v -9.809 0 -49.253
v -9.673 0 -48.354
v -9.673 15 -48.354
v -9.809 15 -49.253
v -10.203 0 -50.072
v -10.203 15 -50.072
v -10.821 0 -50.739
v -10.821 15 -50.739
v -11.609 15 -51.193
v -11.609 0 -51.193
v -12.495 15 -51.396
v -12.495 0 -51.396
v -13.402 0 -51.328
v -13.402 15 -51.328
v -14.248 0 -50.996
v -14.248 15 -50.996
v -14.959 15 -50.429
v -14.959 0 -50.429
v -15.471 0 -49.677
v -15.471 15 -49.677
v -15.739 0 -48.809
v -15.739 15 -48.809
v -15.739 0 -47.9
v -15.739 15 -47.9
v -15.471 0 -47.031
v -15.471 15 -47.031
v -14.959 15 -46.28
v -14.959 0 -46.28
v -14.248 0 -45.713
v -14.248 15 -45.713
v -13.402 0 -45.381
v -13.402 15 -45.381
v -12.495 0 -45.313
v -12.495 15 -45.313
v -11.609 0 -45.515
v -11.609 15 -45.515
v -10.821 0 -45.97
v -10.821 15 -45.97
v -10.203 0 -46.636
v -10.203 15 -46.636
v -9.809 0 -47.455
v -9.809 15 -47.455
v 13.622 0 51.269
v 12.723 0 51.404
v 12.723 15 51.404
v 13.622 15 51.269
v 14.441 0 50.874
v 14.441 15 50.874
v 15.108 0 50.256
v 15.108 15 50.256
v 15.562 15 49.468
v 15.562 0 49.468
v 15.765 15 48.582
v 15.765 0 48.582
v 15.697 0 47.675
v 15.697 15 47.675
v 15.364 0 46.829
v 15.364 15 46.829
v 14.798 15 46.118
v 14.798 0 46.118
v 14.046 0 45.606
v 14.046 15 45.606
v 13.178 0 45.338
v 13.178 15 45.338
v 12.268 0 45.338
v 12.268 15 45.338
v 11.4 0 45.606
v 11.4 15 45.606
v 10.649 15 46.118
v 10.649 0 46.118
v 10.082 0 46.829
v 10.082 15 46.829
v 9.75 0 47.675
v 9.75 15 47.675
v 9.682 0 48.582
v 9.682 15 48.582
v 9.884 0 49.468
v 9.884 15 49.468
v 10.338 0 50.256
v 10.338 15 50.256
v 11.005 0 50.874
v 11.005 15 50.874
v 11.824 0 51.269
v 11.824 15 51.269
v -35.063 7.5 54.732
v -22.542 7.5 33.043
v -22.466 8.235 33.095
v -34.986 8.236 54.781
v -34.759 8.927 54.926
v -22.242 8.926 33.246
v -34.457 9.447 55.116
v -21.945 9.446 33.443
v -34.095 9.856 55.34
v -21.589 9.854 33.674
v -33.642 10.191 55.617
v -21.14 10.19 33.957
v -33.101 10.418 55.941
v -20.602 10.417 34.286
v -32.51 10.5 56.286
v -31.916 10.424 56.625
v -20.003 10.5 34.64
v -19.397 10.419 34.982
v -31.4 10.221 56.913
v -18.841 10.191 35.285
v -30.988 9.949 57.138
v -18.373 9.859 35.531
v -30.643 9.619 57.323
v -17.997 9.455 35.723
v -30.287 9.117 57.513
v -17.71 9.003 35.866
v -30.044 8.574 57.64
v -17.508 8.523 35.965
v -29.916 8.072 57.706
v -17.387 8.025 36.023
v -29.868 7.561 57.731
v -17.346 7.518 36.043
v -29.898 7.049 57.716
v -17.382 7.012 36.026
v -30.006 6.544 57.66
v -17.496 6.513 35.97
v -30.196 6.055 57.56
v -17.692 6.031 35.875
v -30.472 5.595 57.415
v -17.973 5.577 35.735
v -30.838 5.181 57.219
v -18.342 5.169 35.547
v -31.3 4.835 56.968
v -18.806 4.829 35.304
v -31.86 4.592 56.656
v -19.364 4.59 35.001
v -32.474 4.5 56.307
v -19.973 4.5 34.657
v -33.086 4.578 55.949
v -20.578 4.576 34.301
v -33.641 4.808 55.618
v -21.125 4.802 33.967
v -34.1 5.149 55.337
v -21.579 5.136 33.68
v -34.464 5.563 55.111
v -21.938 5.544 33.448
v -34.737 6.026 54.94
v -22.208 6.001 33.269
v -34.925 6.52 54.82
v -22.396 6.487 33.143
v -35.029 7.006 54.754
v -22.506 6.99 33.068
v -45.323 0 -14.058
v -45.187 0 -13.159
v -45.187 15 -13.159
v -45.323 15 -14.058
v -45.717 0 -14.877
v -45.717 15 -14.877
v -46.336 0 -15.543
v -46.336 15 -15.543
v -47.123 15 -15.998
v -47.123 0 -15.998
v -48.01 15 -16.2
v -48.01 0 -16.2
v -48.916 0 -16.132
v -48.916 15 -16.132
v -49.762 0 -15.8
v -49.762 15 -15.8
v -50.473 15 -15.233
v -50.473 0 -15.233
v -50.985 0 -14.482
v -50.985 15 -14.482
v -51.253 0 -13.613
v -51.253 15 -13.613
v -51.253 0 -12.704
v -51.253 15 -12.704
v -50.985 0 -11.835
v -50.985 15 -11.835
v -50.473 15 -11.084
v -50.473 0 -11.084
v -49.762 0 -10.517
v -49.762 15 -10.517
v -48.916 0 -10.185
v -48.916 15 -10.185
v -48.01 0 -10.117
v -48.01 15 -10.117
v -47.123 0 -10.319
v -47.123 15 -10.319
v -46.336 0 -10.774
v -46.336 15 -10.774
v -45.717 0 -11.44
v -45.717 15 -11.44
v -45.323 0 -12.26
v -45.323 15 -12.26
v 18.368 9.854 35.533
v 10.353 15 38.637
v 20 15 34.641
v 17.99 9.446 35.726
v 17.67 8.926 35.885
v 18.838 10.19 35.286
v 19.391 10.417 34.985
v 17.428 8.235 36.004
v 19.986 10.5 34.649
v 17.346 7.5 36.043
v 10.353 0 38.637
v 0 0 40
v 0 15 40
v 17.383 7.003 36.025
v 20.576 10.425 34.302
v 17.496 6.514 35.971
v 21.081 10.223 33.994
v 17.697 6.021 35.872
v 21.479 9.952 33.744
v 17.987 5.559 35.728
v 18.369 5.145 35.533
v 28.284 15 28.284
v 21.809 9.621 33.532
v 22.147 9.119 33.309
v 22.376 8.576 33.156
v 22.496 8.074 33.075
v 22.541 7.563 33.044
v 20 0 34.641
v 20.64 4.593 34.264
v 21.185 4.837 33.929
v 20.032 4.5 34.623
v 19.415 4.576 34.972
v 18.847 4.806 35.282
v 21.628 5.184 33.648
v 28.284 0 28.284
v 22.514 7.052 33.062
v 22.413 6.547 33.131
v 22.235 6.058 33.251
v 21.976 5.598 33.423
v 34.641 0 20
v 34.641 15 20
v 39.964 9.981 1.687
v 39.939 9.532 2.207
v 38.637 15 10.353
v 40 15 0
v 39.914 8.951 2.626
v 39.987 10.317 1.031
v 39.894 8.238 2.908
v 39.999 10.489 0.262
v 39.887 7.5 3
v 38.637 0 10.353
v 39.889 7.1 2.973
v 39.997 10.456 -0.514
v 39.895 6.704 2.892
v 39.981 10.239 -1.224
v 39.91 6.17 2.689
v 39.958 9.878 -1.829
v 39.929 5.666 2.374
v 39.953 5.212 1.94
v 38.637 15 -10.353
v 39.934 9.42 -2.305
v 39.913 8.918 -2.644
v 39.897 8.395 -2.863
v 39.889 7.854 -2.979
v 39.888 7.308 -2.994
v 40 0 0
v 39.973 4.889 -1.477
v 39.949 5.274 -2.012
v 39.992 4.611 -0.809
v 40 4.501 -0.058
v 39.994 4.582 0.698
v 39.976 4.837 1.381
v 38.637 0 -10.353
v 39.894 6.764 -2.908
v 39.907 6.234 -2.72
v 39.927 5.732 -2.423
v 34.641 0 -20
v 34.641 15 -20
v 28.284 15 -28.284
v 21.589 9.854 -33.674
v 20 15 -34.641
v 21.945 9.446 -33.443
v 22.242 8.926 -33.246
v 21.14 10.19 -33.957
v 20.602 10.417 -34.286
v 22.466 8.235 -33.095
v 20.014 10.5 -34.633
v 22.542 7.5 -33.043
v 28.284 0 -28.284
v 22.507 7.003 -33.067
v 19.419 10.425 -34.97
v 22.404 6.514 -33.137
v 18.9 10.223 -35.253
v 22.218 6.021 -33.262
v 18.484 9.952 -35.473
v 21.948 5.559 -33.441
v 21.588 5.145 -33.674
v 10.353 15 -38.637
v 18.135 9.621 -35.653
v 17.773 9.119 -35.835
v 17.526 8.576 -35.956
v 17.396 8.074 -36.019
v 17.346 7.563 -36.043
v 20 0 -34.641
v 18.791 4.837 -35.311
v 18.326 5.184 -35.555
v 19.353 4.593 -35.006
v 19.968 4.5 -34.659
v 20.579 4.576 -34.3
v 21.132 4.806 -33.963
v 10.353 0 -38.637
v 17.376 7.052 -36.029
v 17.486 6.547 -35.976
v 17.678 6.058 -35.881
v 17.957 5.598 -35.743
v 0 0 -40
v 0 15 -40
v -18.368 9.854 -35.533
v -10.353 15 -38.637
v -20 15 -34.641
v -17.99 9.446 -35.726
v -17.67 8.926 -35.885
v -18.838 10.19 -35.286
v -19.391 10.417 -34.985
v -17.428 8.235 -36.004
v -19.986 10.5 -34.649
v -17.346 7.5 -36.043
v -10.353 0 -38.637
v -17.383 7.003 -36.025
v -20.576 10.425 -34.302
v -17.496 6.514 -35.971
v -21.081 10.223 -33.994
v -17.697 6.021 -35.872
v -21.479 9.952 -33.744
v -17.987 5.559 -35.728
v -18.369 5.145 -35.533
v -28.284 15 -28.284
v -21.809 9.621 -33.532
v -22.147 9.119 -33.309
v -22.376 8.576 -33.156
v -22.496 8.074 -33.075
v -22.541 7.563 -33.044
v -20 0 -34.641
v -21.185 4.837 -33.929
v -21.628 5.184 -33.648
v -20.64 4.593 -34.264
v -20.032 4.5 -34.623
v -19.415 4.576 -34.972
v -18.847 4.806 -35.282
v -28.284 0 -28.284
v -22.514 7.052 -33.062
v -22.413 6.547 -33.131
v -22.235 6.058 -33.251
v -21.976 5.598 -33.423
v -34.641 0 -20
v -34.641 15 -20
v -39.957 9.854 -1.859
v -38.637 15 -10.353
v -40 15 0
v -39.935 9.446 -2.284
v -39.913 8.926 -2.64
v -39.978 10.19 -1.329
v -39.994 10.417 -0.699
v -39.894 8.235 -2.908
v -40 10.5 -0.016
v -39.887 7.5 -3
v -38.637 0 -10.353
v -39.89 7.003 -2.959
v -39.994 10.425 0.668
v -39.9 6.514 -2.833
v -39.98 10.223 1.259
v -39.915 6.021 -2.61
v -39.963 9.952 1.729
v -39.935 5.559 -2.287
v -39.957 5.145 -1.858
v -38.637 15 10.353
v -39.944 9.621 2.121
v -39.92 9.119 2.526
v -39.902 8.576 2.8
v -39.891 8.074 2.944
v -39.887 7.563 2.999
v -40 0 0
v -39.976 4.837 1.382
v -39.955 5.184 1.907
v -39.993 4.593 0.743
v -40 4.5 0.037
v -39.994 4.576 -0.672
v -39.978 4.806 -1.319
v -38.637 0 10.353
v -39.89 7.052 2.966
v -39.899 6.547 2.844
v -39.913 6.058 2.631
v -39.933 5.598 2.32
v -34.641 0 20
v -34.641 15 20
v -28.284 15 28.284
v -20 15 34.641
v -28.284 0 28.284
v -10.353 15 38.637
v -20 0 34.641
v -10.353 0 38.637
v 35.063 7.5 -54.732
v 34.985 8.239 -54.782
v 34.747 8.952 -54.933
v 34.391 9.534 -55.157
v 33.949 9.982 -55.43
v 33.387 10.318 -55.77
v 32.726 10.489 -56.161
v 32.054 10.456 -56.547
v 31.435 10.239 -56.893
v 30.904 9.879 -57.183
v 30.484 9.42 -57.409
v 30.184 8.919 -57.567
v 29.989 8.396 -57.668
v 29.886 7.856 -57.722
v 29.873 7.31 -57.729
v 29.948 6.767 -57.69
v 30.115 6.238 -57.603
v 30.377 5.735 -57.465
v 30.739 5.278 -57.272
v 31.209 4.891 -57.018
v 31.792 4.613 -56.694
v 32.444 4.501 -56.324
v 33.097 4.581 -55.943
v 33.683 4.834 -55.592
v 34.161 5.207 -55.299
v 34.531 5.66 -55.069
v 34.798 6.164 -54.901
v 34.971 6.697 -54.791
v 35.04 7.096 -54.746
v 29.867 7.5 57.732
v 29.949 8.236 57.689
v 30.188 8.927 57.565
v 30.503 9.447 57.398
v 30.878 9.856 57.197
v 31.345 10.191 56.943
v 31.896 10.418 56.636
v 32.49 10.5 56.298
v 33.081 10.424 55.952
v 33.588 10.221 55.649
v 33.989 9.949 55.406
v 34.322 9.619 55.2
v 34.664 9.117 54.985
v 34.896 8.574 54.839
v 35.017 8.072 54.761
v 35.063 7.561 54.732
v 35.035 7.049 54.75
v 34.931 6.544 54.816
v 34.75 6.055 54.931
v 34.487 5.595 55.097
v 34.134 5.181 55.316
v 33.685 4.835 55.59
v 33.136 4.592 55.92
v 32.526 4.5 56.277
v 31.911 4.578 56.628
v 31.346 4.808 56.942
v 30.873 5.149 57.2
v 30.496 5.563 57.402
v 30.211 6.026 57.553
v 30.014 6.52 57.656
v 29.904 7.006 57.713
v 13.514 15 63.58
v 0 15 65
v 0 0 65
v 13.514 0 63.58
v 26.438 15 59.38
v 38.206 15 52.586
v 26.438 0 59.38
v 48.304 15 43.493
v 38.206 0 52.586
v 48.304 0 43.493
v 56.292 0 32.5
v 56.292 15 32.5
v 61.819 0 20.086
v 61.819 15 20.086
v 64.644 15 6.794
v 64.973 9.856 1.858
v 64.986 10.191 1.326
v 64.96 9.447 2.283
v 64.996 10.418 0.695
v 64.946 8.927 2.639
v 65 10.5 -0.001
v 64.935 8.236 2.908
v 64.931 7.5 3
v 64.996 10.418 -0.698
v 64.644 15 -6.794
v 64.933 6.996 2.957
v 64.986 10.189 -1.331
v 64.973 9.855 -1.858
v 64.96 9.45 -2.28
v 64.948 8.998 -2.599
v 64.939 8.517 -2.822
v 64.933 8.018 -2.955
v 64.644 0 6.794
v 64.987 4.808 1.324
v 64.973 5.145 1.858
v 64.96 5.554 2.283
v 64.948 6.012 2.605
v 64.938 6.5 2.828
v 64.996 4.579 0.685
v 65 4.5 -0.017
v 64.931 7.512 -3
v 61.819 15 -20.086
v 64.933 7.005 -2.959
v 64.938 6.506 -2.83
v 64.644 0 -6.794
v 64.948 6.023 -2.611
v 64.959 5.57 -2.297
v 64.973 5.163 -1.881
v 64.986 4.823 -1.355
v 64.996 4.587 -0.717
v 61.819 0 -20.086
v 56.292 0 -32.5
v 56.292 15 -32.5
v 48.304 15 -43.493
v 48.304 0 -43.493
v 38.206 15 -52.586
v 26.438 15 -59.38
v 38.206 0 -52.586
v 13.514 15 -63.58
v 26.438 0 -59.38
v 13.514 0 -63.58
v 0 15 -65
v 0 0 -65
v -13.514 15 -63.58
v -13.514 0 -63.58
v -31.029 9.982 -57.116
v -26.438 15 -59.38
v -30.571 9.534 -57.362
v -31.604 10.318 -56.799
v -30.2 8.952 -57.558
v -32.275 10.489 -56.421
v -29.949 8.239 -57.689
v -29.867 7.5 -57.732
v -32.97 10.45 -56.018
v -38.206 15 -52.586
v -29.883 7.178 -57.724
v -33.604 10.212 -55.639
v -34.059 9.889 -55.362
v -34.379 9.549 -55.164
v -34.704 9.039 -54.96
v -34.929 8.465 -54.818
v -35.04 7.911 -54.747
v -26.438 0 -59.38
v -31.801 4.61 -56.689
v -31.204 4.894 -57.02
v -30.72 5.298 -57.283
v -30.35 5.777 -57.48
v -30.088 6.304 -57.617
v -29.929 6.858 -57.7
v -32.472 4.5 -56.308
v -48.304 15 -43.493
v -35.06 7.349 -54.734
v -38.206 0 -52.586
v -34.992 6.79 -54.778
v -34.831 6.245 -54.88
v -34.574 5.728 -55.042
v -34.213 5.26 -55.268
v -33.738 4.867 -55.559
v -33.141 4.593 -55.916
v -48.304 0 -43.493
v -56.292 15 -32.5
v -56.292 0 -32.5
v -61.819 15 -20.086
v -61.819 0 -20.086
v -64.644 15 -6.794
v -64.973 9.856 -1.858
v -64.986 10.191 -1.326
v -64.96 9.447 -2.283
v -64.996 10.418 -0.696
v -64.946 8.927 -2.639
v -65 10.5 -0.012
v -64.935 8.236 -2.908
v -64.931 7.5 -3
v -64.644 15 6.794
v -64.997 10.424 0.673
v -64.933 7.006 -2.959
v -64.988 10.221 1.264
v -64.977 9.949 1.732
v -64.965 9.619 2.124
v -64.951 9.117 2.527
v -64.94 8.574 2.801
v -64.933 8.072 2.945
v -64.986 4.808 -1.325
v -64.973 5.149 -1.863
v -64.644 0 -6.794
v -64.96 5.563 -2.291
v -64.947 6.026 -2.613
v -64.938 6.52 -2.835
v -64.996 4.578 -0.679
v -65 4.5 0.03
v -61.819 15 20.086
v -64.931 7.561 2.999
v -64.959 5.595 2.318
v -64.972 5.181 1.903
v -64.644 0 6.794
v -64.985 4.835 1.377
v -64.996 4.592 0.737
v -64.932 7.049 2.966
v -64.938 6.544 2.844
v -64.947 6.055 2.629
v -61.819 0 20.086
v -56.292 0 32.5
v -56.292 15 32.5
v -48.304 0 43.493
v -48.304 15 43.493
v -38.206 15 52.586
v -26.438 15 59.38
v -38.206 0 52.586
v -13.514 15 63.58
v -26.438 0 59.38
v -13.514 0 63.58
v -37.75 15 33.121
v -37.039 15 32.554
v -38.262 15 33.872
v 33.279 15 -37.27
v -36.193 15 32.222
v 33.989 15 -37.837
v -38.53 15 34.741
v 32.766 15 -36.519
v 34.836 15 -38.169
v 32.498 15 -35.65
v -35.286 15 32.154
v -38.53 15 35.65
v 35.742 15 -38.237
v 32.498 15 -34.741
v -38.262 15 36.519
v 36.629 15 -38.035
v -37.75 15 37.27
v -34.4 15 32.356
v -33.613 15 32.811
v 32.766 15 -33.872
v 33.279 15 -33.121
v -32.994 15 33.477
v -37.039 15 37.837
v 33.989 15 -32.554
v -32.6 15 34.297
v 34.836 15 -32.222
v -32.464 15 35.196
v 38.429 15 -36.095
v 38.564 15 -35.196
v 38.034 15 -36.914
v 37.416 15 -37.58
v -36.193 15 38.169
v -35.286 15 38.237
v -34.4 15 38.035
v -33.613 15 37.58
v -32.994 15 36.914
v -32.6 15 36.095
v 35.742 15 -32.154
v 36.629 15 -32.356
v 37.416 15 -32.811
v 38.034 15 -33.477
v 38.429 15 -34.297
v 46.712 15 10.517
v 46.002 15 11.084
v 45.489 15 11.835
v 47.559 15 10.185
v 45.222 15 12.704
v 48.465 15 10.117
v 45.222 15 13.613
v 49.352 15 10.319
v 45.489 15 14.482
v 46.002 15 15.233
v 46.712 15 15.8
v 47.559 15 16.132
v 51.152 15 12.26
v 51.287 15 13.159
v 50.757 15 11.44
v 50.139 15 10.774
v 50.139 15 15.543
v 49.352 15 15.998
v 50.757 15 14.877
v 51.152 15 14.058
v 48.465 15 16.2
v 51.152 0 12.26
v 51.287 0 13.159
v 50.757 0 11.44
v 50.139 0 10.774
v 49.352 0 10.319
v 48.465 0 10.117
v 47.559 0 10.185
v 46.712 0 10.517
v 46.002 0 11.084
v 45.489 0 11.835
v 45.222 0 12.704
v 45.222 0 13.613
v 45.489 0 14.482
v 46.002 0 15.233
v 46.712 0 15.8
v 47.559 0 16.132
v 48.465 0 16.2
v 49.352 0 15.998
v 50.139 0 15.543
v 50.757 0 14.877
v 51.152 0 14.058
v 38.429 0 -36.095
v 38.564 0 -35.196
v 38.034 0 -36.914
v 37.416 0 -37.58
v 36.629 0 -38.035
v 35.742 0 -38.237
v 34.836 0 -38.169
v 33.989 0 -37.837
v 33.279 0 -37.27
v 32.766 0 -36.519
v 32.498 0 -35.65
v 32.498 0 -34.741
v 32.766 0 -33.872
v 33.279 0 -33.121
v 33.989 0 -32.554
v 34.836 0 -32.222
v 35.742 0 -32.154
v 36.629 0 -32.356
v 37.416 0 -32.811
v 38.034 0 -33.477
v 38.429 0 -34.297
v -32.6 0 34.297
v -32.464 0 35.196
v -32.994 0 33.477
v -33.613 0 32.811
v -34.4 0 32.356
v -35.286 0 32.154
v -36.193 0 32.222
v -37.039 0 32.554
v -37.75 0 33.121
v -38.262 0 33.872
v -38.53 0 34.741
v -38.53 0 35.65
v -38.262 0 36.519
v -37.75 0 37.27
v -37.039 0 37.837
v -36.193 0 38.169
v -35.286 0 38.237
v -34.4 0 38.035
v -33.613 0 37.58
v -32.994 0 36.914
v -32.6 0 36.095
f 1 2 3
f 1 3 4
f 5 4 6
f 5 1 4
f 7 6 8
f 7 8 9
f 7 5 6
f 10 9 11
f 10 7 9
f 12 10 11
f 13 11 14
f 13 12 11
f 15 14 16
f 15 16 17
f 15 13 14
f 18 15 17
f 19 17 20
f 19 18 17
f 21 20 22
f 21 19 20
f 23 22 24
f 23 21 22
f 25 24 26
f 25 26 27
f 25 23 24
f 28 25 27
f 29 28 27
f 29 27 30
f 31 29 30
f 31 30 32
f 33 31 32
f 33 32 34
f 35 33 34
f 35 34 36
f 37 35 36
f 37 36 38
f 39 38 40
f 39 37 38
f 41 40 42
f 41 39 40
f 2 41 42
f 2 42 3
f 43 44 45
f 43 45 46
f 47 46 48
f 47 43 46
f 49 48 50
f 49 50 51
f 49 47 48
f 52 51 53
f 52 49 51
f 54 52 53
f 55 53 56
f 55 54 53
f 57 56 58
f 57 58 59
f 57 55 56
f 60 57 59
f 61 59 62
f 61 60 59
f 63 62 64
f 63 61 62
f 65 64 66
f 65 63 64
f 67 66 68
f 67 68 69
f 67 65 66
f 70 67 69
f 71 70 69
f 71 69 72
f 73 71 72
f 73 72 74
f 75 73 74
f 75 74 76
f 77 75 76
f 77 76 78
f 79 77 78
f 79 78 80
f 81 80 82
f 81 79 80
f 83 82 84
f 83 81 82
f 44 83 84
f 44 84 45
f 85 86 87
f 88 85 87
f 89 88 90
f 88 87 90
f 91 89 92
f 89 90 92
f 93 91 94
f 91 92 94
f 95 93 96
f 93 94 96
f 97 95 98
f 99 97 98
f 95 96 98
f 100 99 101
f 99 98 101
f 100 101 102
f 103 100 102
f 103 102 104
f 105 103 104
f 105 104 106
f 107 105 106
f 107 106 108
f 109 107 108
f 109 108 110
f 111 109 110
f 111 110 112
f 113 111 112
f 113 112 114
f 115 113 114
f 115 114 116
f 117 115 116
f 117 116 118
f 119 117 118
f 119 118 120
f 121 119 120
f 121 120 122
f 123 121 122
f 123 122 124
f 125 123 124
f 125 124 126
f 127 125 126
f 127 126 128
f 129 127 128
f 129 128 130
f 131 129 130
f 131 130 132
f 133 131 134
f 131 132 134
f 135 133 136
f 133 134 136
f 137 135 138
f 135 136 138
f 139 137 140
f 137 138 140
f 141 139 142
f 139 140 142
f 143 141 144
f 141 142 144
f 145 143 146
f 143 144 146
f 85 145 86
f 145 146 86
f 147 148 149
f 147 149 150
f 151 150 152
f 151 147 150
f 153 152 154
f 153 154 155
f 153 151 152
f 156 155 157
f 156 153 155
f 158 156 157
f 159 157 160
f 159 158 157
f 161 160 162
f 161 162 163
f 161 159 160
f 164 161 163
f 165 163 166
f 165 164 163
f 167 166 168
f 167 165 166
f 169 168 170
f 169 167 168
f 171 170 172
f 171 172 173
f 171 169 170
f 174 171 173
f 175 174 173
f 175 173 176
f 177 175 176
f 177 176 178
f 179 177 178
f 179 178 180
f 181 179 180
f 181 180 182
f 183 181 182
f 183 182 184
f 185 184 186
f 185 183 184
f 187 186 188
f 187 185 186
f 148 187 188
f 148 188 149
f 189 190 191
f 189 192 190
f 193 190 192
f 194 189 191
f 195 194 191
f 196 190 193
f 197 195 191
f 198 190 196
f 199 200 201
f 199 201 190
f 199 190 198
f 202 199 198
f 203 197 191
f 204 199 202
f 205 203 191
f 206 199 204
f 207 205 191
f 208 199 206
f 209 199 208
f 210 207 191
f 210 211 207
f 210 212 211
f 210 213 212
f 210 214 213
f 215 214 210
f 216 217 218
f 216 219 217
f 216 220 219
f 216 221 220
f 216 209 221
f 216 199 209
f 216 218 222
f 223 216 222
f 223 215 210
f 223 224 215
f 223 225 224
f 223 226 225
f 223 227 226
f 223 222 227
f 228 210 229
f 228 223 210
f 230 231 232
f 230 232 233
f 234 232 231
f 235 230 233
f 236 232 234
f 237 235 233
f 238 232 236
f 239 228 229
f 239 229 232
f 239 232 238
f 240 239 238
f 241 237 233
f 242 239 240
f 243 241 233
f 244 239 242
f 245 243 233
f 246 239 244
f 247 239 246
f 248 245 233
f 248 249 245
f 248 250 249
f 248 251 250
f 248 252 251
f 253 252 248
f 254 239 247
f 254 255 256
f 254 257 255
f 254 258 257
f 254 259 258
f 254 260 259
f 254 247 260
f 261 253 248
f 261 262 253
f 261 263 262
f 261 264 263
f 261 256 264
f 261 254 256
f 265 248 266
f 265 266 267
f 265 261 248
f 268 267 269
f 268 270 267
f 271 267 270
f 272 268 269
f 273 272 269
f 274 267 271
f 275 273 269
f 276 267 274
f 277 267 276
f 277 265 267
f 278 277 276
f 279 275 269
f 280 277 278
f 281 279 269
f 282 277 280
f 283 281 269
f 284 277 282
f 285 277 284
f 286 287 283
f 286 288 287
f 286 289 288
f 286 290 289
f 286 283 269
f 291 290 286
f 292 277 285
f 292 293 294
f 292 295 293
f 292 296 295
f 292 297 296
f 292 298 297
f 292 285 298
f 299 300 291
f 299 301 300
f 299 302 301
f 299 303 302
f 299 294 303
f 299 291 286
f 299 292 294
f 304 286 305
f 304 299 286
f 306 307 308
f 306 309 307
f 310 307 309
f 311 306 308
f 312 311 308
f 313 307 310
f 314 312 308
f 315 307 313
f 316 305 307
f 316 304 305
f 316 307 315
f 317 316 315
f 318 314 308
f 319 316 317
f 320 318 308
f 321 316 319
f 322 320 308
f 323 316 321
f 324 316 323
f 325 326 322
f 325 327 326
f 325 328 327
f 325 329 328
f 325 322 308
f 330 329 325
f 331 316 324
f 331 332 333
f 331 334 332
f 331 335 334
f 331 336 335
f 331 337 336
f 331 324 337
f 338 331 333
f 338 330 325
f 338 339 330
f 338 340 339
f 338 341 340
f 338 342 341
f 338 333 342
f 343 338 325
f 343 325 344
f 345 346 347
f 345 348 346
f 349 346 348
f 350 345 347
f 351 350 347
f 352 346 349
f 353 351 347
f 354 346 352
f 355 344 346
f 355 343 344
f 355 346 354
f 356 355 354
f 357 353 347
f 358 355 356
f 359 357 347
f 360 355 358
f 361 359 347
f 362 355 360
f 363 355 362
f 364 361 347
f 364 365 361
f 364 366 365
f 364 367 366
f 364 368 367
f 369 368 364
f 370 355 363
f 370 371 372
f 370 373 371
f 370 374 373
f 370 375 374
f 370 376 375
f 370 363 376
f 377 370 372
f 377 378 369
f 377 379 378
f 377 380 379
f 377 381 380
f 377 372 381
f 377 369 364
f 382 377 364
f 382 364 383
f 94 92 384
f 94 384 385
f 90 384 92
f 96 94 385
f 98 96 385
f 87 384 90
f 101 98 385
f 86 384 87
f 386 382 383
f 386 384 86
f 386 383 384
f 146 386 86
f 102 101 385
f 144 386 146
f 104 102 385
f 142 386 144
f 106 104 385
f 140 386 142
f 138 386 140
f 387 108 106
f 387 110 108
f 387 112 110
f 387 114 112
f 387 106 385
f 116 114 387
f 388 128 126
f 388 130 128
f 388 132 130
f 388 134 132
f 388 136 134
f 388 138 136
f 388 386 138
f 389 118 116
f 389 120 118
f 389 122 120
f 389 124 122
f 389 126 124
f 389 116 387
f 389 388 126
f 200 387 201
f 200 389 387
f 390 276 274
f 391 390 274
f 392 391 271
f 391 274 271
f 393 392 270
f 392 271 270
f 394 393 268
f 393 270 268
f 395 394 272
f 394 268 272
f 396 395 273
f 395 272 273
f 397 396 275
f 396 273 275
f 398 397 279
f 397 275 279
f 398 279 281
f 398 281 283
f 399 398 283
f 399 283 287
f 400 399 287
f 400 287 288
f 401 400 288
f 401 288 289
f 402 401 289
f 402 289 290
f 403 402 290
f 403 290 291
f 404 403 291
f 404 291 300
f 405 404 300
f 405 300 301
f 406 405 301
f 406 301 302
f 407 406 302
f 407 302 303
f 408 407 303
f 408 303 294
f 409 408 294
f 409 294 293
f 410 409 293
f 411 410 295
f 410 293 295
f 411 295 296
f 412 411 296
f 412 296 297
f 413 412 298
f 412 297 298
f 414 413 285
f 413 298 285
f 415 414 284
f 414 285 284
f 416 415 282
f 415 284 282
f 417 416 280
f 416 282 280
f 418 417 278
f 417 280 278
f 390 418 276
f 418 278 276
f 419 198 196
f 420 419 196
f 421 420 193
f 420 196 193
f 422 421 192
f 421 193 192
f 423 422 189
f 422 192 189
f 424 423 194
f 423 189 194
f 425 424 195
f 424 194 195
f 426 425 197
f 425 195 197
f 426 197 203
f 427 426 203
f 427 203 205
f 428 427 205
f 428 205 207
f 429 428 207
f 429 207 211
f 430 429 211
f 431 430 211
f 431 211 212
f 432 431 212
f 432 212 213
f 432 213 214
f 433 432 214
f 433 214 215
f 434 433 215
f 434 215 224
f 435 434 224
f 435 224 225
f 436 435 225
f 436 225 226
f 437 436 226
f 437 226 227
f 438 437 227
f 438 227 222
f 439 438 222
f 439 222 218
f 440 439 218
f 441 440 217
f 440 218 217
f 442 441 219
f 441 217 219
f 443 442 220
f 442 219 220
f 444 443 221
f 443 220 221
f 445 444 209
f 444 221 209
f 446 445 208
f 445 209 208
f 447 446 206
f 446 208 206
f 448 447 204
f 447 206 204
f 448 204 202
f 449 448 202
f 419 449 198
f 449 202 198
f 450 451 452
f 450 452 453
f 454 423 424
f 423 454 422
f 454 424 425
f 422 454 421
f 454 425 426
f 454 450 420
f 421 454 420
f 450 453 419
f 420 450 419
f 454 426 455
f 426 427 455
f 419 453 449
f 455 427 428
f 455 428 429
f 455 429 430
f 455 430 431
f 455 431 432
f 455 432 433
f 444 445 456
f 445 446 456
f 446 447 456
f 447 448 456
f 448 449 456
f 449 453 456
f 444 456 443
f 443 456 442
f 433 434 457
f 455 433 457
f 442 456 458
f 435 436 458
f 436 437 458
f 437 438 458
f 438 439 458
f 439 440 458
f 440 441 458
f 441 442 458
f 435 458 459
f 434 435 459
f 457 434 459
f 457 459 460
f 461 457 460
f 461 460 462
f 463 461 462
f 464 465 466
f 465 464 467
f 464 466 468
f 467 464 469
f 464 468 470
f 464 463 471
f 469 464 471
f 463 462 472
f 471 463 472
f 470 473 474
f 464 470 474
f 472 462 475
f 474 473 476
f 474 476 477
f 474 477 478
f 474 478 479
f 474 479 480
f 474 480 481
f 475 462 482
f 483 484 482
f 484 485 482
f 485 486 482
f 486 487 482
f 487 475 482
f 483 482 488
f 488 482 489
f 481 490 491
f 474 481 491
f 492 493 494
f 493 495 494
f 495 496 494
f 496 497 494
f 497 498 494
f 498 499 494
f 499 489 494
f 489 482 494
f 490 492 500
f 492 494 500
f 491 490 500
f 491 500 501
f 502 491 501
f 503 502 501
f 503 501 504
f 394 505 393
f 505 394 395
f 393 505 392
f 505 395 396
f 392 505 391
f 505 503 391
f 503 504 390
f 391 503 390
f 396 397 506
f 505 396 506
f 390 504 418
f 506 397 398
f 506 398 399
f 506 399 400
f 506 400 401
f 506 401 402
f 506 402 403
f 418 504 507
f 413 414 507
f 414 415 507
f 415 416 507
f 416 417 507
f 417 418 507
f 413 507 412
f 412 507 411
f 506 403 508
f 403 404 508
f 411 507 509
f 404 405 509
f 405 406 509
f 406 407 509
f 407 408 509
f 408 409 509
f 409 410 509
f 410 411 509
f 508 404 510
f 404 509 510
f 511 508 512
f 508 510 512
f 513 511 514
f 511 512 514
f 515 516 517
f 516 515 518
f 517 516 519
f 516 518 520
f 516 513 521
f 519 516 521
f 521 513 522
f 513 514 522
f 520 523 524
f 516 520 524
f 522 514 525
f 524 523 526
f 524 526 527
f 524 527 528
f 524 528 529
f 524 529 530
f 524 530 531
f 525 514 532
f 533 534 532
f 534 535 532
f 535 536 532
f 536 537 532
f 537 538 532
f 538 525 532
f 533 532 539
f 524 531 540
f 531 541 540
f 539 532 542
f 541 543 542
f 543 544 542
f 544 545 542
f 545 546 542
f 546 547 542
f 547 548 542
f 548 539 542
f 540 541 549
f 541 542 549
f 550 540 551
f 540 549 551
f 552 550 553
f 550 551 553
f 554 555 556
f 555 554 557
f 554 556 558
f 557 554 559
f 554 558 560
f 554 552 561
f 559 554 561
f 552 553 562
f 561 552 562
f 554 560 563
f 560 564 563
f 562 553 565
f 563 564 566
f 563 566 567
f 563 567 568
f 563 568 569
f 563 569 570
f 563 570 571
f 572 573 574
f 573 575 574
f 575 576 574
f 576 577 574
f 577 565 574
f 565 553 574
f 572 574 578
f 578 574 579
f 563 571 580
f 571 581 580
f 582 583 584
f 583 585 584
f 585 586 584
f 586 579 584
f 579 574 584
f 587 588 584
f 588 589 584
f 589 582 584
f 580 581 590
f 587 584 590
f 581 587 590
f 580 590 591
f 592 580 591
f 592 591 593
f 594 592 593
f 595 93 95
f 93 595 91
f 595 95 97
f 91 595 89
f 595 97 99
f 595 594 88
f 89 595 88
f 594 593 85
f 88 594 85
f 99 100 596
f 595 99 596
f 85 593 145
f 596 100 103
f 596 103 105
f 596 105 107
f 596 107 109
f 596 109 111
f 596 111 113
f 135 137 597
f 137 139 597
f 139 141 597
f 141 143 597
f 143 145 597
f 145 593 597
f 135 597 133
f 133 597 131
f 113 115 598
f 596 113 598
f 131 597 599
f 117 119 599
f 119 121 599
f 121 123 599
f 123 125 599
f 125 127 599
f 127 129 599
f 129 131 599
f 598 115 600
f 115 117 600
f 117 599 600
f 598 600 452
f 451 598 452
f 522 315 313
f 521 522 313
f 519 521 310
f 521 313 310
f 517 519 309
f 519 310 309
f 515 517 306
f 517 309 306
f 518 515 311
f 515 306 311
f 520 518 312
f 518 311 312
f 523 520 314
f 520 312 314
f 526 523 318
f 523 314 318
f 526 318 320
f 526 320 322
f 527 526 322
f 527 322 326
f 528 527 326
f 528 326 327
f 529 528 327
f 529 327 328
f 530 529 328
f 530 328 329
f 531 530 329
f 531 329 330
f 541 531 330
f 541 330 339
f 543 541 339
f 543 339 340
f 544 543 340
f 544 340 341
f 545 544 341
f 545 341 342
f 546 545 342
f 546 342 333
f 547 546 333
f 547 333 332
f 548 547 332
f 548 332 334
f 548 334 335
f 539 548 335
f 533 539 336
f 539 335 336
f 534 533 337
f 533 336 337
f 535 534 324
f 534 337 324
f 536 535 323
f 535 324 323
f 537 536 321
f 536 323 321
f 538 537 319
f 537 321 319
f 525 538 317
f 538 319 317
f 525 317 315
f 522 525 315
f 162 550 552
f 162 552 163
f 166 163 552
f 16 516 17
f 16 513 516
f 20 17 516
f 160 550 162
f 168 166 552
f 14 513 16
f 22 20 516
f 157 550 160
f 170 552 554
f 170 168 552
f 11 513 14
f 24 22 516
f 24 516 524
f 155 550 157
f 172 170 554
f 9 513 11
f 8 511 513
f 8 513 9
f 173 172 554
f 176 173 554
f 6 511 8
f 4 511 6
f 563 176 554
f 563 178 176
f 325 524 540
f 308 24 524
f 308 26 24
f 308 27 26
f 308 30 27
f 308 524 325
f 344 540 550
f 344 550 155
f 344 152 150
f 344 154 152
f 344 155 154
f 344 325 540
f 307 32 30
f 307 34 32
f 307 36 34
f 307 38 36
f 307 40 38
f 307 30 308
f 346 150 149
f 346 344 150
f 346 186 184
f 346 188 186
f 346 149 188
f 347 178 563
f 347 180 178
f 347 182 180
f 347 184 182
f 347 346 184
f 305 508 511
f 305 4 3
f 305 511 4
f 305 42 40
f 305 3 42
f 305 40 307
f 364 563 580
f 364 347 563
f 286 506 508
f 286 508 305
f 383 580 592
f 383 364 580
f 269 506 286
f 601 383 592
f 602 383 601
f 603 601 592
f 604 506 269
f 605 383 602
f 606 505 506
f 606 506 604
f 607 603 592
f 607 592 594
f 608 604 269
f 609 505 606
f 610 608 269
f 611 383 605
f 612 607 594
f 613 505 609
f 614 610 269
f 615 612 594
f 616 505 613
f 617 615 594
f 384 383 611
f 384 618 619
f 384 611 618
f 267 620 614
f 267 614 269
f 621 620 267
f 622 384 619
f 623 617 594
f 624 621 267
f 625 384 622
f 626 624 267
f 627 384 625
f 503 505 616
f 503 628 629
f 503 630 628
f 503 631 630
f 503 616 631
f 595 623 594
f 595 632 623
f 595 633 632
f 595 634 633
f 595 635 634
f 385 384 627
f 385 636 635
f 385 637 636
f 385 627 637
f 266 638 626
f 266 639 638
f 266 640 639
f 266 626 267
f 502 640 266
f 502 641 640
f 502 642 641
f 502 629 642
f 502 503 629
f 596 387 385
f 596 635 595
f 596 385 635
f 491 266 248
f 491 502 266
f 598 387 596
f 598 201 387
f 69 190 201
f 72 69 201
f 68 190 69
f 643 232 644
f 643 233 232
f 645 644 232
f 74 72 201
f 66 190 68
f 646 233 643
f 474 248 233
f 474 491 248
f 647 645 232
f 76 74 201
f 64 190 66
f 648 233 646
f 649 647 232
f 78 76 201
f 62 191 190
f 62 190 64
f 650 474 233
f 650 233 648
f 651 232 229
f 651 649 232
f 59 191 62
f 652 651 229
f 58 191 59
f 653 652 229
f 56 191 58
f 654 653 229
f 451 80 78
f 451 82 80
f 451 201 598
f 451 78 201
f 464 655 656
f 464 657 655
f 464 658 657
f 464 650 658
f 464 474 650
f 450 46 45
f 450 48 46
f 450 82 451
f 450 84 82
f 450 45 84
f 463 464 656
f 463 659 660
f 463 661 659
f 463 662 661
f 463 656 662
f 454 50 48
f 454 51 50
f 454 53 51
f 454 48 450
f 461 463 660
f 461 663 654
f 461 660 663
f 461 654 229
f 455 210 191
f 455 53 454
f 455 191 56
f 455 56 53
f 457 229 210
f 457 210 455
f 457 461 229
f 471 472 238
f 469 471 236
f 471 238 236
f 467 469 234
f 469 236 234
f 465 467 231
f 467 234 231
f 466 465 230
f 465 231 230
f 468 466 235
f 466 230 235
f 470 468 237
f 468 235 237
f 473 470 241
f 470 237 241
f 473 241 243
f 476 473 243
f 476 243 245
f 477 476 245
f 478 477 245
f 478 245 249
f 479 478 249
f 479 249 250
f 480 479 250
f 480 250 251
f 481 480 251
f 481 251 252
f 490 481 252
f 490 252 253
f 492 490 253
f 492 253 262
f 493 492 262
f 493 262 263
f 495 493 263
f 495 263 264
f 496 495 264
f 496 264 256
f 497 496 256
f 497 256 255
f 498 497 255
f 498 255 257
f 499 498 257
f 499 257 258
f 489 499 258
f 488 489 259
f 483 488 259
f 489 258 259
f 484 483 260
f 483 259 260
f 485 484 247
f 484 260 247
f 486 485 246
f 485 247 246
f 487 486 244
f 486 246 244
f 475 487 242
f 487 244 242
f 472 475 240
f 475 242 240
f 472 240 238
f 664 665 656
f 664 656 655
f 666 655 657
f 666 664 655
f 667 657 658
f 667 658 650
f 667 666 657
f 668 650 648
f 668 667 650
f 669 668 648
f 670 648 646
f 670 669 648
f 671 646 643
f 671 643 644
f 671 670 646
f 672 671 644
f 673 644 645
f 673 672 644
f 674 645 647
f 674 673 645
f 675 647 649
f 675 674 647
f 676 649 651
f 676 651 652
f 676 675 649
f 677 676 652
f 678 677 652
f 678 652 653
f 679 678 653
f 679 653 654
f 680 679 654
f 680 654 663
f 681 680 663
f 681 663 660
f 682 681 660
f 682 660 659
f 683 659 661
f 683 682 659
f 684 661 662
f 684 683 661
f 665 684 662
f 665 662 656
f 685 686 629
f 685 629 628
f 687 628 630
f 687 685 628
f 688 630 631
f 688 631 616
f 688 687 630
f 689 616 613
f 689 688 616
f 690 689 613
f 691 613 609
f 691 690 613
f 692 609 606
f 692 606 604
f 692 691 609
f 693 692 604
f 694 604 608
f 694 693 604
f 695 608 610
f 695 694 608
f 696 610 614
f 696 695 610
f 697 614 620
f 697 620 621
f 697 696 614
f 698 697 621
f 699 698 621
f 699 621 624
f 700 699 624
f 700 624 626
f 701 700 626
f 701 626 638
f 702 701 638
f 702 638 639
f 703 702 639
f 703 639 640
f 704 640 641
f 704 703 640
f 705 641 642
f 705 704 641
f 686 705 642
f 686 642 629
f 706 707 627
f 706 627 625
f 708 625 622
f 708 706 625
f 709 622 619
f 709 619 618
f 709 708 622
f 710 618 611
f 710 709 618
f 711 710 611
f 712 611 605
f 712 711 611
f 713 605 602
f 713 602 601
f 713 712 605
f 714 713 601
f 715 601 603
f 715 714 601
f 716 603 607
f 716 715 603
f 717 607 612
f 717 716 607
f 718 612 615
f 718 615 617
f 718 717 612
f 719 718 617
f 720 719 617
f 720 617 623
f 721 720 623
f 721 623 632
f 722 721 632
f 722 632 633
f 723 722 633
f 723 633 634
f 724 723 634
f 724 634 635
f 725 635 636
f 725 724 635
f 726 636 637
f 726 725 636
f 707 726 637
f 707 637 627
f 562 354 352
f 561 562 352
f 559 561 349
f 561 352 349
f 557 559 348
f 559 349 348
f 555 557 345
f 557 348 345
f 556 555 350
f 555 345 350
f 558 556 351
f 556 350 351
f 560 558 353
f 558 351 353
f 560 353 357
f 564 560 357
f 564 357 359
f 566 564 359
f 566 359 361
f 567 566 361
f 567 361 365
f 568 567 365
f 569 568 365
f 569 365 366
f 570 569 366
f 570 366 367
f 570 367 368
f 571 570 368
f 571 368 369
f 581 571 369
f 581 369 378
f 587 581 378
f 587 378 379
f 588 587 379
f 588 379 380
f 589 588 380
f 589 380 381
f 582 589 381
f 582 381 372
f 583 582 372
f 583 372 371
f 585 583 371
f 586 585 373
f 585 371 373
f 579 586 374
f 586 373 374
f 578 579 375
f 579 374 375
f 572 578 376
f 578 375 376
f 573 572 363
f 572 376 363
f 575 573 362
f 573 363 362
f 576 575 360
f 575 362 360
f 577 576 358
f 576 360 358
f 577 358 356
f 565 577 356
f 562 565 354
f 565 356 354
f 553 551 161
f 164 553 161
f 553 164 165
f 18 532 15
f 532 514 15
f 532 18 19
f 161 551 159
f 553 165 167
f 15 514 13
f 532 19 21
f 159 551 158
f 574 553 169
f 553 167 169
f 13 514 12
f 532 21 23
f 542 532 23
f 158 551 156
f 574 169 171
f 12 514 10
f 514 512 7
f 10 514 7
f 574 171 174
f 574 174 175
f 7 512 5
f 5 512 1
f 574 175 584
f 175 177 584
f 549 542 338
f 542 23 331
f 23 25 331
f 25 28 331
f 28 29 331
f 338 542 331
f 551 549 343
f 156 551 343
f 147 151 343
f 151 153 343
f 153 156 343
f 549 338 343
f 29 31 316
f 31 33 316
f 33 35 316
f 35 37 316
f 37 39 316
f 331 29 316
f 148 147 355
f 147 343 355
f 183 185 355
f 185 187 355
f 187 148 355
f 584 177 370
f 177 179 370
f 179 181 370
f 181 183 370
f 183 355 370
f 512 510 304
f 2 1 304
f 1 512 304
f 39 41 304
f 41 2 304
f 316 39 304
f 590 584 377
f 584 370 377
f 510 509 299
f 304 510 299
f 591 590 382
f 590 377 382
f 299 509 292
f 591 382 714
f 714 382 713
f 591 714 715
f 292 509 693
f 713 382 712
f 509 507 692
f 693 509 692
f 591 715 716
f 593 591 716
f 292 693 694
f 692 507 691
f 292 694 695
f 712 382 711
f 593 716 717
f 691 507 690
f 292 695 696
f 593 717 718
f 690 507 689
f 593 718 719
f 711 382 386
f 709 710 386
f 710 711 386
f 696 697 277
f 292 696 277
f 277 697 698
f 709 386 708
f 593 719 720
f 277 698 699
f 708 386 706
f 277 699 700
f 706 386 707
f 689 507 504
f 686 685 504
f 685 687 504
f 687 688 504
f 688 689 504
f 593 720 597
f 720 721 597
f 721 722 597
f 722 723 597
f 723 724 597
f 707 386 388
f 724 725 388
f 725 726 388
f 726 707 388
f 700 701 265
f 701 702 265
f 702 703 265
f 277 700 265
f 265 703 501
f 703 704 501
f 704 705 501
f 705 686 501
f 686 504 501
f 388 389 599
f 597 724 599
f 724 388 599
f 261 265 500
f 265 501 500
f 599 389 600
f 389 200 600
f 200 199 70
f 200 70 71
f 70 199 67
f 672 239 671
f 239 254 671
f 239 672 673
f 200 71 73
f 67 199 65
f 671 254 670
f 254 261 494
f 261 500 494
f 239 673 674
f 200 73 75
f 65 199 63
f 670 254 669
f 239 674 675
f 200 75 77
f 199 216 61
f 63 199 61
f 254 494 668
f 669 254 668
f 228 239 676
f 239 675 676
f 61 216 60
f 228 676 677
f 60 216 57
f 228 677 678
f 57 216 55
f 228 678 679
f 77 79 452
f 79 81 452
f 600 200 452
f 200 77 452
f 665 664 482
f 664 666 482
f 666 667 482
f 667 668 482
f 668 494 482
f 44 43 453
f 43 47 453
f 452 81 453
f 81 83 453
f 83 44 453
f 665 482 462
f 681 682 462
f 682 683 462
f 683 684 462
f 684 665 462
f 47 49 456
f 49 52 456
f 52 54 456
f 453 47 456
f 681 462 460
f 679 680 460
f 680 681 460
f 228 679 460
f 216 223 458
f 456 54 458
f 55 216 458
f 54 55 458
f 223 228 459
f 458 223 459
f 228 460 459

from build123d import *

# Parameters (mm, degrees)
SKETCH1_R             = 65
SKETCH1_R_2           = 40
SKETCH1_R_3           = 3.05
BOSS_EXTRUDE1_DEPTH   = 15
SKETCH2_R             = 3
CUT_EXTRUDE1_DEPTH    = 94.139680051
CIRPATTERN1_COUNT     = 6
CIRPATTERN2_OUTLINE_R = 3.05
CIRPATTERN2_DEPTH     = 15


# Read off the part's stored shape, not the designer's step: CirPattern2
with BuildPart() as part:
    # Sketch1 → Boss-Extrude1 (new body)
    with BuildSketch(Plane(origin=(0, 0, 0), x_dir=(1, 0, 0), z_dir=(0, 1, 0))):
        with Locations(Location((0, 0, 0), (0, 0, 270))):
            Circle(SKETCH1_R)
        with Locations(Location((0, 0, 0), (0, 0, 270))):
            Circle(SKETCH1_R_2, mode=Mode.SUBTRACT)
        with Locations(Location((12.723046489, -48.354152749, 0), (0, 0, 270))):
            Circle(SKETCH1_R_3, mode=Mode.SUBTRACT)
    extrude(amount=BOSS_EXTRUDE1_DEPTH)

    # Sketch2 → Cut-Extrude1 (cut, through all)
    with BuildSketch(Plane(origin=(0, 0, 0), x_dir=(0, 0, -1), z_dir=(1, 0, 0))):
        with Locations((0, 7.5)):
            Circle(SKETCH2_R)
    cut_extrude1 = extrude(amount=-CUT_EXTRUDE1_DEPTH, mode=Mode.SUBTRACT)

    # CirPattern1: Cut-Extrude1 ×6 about axis
    cirpattern1_axis = Axis((0, 15, 0), (0, 1, 0))
    for i in range(1, CIRPATTERN1_COUNT):
        add(cut_extrude1.rotate(cirpattern1_axis, i * 360 / CIRPATTERN1_COUNT), mode=Mode.SUBTRACT)

    # CirPattern2 outline → CirPattern2 (cut)
    with BuildSketch(Plane(origin=(0, 0, 0), x_dir=(1, 0, 0), z_dir=(0, 1, 0))):
        with Locations((-35.514401414, -35.195557847)):
            Circle(CIRPATTERN2_OUTLINE_R)
        with Locations((-48.237447903, 13.158594901)):
            Circle(CIRPATTERN2_OUTLINE_R)
        with Locations((-12.723046489, 48.354152749)):
            Circle(CIRPATTERN2_OUTLINE_R)
        with Locations((35.514401414, 35.195557847)):
            Circle(CIRPATTERN2_OUTLINE_R)
        with Locations((48.237447903, -13.158594901)):
            Circle(CIRPATTERN2_OUTLINE_R)
    extrude(amount=CIRPATTERN2_DEPTH, mode=Mode.SUBTRACT)


solid = part.part
